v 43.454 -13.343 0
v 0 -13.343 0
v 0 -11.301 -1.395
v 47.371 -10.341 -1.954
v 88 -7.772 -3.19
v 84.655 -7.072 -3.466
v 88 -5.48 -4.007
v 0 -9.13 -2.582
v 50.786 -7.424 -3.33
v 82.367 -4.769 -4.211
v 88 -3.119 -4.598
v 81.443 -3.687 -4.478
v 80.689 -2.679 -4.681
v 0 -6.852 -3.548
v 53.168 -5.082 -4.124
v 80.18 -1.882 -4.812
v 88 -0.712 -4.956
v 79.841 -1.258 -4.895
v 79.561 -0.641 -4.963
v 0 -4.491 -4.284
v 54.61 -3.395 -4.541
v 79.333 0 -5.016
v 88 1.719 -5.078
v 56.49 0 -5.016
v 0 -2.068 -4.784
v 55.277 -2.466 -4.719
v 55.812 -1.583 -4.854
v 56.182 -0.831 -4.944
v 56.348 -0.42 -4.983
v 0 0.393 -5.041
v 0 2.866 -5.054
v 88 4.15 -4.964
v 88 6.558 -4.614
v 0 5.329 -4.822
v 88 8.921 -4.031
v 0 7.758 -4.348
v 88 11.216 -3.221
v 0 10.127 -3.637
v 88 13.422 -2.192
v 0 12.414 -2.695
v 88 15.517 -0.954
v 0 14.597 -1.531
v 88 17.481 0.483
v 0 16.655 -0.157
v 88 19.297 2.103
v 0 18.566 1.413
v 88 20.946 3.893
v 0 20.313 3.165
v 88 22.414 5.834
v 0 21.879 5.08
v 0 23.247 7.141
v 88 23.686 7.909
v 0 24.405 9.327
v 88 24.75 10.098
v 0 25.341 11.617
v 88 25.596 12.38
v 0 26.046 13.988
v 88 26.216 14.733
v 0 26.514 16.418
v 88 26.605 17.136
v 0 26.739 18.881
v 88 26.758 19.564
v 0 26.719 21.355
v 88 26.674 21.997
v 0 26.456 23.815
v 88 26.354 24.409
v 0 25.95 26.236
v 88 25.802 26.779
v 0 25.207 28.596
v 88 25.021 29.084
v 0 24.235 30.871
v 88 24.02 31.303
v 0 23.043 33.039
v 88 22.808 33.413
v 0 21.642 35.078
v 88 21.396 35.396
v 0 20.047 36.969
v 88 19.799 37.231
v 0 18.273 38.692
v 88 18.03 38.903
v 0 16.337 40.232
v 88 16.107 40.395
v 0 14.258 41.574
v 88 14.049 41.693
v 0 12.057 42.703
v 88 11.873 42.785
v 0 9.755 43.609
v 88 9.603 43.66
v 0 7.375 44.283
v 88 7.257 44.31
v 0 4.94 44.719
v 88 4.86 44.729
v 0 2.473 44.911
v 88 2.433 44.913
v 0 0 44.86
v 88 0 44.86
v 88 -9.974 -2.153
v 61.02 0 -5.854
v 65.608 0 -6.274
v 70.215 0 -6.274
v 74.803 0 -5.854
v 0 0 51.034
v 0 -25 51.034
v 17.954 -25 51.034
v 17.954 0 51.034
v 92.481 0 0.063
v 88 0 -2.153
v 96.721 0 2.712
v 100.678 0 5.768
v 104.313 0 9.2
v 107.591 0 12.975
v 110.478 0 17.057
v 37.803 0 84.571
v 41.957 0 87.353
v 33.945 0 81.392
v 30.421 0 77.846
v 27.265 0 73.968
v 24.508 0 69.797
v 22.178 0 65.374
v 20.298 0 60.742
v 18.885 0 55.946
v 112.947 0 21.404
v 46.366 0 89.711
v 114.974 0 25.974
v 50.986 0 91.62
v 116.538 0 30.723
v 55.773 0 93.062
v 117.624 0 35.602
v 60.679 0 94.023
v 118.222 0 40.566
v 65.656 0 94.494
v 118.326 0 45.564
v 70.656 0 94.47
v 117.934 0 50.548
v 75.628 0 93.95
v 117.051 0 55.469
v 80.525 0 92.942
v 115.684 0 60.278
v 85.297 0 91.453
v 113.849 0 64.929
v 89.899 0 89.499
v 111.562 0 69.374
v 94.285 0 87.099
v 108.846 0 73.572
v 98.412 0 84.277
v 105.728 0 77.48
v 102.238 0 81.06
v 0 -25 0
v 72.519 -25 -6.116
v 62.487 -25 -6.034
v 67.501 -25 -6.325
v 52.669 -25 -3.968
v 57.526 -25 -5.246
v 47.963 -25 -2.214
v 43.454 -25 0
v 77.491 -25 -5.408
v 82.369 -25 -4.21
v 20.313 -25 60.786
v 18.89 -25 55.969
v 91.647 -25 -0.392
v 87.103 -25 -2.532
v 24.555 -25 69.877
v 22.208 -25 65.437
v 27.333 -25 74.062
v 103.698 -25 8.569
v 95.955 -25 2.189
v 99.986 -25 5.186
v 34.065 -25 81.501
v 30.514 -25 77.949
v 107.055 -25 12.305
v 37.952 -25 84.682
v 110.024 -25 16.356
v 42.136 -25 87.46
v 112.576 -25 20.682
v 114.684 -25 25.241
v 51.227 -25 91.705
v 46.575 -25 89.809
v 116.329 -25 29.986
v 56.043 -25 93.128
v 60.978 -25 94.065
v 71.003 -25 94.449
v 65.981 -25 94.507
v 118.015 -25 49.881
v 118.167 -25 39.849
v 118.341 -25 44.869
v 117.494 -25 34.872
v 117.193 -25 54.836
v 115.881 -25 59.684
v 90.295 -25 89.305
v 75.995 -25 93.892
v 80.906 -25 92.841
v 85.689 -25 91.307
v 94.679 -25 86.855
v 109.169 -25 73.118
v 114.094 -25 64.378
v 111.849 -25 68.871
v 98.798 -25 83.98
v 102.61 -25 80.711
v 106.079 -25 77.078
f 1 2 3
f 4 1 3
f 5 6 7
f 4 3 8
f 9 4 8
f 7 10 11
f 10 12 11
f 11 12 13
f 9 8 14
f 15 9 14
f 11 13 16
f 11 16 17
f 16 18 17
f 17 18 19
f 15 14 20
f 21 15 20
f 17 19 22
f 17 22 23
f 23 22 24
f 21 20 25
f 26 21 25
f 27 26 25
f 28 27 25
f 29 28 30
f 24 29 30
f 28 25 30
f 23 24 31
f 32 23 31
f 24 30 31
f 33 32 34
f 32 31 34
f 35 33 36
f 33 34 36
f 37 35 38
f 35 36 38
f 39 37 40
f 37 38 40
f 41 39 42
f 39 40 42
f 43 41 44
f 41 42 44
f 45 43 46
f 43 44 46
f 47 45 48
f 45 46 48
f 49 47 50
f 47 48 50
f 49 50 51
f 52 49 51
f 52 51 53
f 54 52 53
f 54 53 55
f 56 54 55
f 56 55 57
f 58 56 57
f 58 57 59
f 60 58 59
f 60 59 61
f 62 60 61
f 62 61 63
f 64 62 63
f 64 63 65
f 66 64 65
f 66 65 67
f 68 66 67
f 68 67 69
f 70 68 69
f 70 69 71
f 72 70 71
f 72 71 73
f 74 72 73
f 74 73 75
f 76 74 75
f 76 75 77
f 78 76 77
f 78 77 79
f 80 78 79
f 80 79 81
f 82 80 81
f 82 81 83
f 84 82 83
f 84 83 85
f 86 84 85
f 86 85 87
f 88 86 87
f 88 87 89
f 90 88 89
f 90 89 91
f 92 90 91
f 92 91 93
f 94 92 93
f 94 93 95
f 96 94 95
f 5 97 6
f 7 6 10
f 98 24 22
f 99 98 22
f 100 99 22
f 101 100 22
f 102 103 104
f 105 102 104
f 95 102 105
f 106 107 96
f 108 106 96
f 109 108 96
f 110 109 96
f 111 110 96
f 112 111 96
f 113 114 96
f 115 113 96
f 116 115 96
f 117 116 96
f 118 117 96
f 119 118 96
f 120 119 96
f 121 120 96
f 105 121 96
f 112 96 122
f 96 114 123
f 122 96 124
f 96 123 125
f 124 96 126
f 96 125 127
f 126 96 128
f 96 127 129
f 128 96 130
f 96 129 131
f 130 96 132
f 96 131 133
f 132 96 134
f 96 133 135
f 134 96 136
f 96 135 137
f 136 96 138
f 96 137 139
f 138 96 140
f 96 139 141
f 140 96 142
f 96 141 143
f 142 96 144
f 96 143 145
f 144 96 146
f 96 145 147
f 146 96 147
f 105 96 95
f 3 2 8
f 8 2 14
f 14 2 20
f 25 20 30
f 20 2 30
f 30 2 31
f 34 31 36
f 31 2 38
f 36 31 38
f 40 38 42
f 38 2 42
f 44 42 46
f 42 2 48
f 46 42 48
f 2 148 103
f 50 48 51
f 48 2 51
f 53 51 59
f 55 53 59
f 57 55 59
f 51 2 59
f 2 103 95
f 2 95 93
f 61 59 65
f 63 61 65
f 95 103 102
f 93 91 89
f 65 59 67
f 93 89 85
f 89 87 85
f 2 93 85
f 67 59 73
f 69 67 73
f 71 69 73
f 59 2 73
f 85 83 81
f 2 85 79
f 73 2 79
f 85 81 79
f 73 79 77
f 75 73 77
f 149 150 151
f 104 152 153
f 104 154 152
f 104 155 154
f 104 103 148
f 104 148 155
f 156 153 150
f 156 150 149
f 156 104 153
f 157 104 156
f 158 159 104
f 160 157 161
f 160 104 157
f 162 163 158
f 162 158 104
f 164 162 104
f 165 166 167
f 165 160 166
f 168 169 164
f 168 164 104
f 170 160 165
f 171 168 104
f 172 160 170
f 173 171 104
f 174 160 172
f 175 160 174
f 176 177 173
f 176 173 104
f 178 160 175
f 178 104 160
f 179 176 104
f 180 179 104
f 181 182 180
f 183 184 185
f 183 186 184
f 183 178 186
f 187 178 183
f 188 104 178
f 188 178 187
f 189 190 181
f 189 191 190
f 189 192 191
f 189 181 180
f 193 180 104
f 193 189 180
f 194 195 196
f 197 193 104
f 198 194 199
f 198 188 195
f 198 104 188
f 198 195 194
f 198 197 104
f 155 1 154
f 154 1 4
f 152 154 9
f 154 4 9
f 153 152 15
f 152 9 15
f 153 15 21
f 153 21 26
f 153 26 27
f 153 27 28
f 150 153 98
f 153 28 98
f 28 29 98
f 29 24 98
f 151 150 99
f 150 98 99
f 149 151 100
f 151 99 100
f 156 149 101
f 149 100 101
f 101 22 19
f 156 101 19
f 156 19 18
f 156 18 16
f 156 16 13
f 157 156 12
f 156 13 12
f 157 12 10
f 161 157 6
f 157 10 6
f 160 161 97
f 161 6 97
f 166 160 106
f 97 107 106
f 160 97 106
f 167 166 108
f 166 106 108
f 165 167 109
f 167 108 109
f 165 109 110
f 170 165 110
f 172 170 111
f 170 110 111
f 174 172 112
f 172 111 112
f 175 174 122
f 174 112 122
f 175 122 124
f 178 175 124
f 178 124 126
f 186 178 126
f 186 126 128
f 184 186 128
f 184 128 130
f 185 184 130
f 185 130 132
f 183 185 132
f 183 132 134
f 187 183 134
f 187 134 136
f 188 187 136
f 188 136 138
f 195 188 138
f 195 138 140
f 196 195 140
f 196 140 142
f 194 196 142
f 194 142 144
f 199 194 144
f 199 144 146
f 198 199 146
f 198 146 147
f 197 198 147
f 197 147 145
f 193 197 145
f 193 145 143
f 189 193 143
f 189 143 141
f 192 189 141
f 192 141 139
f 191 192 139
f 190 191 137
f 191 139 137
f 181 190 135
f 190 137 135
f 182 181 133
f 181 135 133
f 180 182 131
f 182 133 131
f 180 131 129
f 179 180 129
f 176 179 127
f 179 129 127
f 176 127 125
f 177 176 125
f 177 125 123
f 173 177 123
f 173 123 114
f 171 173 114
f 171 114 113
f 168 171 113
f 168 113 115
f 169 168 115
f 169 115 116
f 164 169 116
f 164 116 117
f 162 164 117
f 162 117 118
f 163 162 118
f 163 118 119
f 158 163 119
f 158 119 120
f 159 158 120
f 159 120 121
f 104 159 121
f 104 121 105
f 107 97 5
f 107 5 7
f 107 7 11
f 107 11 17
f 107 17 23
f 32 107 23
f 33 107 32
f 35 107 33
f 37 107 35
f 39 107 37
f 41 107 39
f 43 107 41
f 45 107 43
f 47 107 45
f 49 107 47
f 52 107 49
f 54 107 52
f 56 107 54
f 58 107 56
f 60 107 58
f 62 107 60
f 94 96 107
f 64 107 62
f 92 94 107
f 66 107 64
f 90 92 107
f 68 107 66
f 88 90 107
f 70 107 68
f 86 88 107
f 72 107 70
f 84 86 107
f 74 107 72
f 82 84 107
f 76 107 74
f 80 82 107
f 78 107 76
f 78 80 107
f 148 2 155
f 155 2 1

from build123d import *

# Parameters (mm, degrees)
F0_W     = 71.5159550309
F0_H     = 51.0343238711
F1_DEPTH = 25
F2_R     = 25
F3_DEPTH = 88
F4_R     = 50.4354263915
F5_DEPTH = 25


with BuildPart() as f1:
    # F0 (on Front) → F1 (new body)
    with BuildSketch(Plane.XZ):
        with Locations((35.7579775155, 25.5171619356)):
            Rectangle(F0_W, F0_H)
    extrude(amount=F1_DEPTH)

    # F2 (on Right) → F3 (join)
    with BuildSketch(Plane.YZ):
        with Locations((1.7605778567, 19.9215863818)):
            Circle(F2_R)
    extrude(amount=F3_DEPTH)

    # F4 (on Front) → F5 (join)
    with BuildSketch(Plane.XZ):
        with Locations((67.9112821817, 44.1088192165)):
            Circle(F4_R)
    extrude(amount=F5_DEPTH)


solid = f1.part
